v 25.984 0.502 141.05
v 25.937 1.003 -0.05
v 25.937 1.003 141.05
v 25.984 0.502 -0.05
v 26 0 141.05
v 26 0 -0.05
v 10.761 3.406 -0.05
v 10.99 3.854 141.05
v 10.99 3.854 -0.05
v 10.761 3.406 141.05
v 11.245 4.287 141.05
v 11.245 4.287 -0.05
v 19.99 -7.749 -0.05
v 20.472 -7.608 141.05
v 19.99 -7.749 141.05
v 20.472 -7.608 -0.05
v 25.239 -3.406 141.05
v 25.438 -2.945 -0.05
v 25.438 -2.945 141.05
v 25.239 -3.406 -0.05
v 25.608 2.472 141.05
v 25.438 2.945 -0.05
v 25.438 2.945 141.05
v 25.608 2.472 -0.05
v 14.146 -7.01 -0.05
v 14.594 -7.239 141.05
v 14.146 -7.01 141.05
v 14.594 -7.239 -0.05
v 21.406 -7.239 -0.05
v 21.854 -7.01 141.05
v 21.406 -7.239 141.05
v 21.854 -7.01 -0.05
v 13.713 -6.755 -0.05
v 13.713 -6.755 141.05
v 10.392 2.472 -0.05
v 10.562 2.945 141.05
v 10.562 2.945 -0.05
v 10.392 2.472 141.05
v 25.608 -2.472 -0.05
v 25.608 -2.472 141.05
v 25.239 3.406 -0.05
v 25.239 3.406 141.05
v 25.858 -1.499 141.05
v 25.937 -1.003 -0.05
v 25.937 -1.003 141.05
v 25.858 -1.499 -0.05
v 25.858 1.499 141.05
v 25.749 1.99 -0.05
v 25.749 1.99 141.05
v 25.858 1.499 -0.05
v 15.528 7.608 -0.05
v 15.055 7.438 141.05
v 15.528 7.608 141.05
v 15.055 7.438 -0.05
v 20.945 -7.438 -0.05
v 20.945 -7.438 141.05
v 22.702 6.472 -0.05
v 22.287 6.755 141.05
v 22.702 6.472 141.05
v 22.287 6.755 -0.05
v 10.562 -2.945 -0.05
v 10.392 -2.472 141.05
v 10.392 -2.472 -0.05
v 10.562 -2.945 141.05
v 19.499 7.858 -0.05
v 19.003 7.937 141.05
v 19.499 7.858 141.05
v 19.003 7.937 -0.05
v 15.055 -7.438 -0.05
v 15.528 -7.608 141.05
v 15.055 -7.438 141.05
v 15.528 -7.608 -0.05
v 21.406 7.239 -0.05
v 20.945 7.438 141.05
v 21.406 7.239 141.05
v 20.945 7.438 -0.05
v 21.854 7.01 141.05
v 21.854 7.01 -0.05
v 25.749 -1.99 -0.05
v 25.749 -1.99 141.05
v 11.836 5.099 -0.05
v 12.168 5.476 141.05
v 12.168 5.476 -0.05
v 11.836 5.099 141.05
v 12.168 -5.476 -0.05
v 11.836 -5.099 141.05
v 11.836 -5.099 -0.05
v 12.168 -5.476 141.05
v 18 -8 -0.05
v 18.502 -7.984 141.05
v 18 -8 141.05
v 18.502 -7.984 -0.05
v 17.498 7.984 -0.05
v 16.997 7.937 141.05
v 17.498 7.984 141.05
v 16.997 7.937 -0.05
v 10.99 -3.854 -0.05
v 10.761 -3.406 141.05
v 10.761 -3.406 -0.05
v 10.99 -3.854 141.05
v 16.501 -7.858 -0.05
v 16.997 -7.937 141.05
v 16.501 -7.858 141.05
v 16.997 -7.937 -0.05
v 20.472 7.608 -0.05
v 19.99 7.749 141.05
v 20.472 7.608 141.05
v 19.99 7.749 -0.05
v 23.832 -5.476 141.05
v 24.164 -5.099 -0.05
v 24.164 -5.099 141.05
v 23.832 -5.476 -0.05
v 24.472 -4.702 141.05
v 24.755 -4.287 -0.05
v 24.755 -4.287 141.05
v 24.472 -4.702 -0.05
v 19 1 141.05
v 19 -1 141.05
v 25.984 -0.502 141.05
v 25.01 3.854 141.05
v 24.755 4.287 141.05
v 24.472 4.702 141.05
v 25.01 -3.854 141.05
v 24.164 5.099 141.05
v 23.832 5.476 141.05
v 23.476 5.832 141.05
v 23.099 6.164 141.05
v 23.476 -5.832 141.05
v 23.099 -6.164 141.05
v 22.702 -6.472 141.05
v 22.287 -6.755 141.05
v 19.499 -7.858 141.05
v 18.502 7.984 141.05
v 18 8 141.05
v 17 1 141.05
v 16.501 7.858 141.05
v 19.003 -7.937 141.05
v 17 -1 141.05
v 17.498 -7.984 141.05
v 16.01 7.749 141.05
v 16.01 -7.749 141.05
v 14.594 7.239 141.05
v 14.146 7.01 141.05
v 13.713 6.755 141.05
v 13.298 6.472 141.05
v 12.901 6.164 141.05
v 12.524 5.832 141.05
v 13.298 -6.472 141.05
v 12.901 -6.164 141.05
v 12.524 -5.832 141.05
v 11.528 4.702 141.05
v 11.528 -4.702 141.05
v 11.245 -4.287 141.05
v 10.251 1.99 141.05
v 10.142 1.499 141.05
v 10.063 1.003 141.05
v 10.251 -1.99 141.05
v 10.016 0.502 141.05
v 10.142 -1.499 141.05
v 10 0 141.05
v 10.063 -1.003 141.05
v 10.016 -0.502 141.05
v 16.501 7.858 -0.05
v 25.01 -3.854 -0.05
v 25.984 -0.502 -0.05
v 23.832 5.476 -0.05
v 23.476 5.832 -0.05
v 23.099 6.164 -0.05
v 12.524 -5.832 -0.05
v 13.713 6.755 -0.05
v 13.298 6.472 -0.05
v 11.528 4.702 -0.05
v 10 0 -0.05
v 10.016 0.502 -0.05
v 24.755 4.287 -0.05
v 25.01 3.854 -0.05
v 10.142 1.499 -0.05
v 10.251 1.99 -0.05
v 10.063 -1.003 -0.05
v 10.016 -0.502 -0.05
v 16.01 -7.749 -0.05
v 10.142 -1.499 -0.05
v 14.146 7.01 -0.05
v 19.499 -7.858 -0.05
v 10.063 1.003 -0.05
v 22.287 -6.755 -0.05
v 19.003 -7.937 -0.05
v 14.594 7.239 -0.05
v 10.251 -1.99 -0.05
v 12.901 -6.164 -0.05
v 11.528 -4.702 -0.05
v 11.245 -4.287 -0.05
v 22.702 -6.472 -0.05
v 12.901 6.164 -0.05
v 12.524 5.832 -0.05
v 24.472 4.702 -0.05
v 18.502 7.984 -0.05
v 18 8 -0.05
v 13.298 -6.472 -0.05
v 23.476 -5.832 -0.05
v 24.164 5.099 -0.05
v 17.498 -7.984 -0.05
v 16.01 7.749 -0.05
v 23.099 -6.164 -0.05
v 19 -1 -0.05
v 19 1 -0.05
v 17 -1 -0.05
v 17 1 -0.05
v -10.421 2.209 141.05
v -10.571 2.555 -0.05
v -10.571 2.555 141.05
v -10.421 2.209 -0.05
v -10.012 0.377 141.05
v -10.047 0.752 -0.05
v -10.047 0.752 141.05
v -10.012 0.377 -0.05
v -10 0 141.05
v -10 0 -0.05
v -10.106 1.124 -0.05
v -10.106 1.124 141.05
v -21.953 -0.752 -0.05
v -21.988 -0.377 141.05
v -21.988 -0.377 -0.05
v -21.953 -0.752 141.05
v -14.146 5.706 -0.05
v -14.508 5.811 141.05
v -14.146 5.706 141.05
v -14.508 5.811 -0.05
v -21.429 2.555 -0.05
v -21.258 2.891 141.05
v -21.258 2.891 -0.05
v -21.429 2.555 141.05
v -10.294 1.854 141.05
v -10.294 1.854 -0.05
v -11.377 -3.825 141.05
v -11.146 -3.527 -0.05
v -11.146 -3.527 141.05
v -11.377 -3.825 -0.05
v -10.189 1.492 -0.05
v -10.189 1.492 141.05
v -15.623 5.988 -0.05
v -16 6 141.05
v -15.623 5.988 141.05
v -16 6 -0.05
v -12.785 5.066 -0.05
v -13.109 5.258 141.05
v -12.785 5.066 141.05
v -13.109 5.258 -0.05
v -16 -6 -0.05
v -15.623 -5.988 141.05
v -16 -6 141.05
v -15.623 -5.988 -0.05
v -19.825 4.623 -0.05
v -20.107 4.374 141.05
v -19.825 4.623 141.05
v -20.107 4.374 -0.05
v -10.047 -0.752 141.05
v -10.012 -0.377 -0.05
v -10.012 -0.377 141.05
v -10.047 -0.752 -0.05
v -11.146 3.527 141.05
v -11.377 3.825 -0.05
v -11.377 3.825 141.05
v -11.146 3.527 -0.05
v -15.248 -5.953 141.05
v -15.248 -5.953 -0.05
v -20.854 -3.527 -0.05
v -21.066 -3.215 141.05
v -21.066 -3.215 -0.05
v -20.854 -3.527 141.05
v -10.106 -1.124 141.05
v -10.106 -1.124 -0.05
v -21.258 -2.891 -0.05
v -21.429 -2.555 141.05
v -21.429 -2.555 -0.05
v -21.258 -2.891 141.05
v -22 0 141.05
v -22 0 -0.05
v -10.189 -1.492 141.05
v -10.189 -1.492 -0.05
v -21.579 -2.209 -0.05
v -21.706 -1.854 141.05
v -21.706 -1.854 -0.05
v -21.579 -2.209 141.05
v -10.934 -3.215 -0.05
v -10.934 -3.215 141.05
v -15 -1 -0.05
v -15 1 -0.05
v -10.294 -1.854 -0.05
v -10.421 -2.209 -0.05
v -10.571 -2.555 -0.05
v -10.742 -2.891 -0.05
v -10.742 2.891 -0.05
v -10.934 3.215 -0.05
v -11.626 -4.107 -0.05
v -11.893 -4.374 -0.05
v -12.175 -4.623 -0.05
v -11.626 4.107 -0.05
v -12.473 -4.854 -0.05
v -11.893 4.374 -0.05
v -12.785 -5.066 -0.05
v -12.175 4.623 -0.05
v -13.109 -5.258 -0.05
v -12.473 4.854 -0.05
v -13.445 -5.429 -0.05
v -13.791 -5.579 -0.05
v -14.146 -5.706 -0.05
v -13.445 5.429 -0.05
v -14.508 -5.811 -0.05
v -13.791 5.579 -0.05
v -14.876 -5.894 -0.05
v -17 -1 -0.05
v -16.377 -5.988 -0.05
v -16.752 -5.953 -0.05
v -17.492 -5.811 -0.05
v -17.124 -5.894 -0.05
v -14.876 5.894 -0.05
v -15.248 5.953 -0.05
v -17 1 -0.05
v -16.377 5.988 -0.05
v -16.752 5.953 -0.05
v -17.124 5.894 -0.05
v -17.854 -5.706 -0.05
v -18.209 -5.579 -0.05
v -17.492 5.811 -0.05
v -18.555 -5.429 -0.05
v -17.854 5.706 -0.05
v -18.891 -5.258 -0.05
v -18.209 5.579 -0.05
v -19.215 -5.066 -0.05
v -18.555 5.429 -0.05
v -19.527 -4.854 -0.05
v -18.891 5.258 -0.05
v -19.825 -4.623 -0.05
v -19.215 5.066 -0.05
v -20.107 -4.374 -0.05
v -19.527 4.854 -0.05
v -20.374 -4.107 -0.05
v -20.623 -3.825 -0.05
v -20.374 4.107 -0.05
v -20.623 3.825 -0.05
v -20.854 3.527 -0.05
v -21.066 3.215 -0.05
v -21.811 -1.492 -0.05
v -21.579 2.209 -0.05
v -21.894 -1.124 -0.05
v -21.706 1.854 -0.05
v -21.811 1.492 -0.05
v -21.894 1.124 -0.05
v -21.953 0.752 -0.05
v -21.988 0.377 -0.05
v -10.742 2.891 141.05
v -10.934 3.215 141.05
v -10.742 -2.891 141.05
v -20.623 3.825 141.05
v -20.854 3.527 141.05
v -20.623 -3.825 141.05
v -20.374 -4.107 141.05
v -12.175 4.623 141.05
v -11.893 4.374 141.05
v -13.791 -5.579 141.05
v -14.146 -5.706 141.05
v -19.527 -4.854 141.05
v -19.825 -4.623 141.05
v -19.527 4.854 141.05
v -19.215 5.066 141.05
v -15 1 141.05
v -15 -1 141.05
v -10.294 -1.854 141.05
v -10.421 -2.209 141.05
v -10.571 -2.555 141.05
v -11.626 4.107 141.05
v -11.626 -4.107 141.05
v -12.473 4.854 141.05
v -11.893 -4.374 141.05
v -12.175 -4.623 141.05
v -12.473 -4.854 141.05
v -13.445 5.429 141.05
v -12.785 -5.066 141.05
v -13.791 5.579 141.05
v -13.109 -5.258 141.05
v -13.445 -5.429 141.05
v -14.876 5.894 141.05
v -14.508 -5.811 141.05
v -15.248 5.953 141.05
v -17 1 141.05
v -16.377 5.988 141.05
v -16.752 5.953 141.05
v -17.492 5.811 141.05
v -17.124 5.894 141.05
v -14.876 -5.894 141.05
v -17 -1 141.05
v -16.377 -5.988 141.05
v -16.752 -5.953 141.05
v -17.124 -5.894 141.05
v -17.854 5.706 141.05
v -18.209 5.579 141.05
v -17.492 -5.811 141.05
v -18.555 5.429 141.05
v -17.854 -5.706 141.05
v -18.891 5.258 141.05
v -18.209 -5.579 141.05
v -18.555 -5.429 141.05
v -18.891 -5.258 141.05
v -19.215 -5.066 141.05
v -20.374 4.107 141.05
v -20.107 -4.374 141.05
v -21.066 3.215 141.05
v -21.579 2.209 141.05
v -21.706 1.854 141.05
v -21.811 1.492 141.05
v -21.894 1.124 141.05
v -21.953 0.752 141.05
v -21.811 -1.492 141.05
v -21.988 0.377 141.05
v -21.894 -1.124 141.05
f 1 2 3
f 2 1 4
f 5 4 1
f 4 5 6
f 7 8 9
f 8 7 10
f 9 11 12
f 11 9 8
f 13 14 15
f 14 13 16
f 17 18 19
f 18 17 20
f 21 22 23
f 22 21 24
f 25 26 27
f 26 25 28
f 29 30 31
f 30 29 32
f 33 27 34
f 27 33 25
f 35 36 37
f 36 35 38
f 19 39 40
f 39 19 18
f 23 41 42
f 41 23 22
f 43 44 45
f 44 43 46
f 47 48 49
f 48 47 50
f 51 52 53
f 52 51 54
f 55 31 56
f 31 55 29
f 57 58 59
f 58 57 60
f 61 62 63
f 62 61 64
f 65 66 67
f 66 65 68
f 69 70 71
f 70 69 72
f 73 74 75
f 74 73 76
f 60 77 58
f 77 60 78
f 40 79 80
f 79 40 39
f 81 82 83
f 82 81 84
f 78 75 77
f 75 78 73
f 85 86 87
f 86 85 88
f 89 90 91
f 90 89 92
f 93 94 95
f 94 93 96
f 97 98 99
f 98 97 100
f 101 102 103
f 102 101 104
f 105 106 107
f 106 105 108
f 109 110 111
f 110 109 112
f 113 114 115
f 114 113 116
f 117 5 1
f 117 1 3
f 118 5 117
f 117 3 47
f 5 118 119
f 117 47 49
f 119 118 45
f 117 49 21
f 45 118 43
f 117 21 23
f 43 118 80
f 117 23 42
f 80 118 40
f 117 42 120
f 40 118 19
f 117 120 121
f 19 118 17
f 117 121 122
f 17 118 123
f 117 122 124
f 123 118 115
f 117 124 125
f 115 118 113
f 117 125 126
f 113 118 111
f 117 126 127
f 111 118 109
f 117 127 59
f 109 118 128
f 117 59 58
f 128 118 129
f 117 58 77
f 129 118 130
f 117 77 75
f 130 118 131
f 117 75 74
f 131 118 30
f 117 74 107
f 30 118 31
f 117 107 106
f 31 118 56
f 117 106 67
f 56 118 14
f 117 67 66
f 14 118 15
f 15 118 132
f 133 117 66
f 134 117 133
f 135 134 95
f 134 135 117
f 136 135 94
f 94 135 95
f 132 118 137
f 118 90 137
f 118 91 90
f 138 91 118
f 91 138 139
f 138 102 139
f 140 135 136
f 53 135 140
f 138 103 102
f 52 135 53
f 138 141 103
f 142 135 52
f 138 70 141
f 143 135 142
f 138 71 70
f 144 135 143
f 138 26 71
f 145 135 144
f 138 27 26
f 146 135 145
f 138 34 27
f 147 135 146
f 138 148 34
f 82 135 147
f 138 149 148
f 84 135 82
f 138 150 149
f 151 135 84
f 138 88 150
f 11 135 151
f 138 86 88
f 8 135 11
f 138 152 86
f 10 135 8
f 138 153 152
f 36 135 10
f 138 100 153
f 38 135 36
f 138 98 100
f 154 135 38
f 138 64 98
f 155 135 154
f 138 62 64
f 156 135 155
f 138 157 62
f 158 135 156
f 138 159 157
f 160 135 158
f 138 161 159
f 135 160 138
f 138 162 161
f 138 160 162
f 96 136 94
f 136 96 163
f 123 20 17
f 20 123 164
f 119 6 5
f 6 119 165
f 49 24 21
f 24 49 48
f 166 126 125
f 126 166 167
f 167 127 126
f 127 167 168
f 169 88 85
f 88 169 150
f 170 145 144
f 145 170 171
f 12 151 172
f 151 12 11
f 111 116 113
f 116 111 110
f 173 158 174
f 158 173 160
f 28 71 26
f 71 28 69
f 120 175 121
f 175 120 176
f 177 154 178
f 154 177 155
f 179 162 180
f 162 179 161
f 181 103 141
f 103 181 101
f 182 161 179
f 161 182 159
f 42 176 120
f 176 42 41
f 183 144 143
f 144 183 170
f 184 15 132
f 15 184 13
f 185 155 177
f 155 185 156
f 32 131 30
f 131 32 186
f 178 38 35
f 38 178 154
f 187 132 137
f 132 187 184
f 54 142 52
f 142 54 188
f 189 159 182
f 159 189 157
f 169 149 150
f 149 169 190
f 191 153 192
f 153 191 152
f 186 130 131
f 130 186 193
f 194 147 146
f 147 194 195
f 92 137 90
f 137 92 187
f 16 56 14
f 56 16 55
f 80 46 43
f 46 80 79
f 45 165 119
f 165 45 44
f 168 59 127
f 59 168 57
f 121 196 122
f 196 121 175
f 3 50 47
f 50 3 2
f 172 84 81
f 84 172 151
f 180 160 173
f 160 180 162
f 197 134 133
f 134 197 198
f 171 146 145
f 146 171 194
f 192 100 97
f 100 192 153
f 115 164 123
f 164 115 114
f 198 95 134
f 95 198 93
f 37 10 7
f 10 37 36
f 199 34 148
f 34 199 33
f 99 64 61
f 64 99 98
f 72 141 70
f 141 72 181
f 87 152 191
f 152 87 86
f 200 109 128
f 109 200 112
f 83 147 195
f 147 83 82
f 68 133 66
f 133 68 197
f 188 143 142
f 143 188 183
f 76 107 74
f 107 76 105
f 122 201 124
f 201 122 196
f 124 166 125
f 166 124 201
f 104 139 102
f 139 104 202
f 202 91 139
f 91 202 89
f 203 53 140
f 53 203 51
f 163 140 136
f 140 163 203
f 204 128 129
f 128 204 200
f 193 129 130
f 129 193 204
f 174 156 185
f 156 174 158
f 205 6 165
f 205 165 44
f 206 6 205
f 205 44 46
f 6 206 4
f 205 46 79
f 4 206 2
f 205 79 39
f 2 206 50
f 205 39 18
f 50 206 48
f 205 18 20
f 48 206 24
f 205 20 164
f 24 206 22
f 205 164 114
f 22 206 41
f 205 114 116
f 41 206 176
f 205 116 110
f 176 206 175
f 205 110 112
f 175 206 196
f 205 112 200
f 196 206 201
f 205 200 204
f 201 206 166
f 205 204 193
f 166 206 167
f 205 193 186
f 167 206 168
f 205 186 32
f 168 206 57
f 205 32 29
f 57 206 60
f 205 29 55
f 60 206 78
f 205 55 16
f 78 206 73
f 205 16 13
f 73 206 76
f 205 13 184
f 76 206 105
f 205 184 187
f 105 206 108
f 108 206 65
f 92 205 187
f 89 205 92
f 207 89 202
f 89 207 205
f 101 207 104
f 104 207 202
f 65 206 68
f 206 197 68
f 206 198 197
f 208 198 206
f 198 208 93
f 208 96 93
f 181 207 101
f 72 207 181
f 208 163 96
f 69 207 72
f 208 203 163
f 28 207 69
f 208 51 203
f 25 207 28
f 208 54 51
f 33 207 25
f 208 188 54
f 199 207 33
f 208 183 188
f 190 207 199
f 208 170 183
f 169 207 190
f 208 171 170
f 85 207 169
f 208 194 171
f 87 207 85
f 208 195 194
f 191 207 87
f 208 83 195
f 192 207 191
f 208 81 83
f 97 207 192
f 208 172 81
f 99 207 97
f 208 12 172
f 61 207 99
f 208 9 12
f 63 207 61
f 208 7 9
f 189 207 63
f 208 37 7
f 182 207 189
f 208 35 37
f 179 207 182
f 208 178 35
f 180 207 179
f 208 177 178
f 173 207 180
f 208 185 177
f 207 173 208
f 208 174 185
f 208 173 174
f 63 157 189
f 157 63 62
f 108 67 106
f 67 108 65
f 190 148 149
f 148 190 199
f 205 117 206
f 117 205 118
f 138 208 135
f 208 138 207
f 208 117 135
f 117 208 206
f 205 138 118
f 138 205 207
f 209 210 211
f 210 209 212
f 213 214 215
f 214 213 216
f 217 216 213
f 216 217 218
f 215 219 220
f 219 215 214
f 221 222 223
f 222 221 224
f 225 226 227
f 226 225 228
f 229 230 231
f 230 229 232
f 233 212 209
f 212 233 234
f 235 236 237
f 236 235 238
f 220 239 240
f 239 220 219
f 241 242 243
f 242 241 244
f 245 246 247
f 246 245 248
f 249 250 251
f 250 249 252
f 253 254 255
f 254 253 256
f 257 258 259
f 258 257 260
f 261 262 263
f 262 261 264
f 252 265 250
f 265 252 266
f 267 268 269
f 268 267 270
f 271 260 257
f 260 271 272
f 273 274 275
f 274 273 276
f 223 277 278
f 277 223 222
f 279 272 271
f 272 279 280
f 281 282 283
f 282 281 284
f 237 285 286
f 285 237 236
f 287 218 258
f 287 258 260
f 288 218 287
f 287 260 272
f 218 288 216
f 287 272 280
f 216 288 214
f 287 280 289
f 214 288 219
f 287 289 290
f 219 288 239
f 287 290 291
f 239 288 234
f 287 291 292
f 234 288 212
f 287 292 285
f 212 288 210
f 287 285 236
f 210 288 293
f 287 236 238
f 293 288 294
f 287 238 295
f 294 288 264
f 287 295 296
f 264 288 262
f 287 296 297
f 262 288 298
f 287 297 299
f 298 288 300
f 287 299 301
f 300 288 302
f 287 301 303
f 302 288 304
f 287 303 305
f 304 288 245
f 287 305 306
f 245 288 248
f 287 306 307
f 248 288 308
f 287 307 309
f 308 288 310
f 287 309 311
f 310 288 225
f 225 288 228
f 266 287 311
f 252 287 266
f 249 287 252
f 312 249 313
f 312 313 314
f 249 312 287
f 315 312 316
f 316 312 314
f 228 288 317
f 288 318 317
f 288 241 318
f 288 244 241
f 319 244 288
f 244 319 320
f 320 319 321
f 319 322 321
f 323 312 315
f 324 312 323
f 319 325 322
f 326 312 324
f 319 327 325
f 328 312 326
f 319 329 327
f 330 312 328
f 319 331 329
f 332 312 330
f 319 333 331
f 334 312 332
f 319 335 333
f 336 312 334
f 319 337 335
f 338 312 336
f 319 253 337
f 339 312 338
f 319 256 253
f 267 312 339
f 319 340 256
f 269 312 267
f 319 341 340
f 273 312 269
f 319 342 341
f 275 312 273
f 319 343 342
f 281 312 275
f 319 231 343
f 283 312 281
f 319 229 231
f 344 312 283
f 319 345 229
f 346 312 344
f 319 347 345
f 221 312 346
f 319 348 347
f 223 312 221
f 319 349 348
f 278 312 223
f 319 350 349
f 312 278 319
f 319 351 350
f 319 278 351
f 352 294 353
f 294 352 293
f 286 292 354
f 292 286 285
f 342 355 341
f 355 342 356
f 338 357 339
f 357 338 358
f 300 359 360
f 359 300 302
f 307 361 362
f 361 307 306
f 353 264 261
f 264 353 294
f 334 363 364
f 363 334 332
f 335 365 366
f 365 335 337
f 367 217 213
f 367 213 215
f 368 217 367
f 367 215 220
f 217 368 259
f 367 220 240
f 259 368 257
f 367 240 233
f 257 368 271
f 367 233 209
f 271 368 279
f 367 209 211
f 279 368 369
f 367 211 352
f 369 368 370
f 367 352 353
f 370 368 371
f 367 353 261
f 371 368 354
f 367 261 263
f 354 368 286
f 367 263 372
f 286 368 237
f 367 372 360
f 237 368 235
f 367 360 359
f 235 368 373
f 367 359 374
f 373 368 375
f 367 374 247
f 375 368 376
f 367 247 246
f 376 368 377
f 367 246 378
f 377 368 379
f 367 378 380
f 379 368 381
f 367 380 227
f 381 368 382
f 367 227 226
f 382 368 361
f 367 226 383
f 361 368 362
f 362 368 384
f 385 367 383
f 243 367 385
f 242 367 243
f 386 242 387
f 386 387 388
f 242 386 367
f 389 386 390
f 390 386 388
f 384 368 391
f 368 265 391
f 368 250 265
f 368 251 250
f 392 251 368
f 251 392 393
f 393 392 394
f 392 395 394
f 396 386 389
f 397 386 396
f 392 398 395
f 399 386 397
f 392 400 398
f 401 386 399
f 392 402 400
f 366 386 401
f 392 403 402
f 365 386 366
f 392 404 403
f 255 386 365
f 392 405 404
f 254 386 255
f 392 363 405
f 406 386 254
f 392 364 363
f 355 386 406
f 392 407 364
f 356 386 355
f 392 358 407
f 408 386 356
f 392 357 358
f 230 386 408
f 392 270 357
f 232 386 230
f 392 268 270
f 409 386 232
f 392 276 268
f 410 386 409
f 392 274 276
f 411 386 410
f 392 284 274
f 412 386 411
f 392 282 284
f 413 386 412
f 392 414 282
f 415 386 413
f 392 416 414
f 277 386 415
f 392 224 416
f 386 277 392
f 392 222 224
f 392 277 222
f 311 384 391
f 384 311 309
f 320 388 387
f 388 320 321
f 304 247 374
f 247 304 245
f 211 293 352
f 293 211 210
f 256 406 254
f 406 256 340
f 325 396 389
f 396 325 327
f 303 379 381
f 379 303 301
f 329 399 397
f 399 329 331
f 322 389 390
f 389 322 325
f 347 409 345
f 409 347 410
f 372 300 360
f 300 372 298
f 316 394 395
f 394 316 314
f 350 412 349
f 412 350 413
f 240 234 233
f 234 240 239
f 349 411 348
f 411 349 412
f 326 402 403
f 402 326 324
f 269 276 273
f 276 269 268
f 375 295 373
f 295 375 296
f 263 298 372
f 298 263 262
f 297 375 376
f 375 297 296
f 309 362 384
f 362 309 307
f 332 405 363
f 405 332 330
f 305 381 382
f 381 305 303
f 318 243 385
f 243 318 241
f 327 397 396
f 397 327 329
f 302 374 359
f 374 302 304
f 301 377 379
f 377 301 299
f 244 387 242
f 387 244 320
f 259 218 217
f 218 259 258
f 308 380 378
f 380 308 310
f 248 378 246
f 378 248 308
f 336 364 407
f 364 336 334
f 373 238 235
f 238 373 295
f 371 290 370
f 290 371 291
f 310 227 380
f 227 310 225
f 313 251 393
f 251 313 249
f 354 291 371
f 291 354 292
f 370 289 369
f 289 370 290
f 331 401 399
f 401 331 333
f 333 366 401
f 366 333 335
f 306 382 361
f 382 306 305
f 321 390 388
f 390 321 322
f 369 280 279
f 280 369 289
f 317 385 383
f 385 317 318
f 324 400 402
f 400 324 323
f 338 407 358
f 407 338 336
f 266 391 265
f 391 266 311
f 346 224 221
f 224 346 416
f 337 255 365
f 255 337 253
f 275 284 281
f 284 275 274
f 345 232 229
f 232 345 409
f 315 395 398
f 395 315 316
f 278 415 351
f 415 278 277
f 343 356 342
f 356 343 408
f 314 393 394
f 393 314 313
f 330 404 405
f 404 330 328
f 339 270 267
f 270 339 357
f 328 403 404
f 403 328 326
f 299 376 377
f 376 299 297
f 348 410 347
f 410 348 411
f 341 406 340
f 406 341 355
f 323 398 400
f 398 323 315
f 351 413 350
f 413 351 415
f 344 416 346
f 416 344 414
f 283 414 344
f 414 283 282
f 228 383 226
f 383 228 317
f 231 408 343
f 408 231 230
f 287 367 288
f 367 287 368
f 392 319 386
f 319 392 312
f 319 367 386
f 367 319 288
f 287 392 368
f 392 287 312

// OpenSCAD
// file: ../Settings.scad
// Mesurements Of Platform Actual & Global Settings
// Mesurements ACTUAL
PlateWidth = 228;
PlateDepth = 145;
PlateHeight = 5;

ArmWidth = 20;
ArmHeight = 24;
ArmForwardProjection = 25;
ArmRearProjection = 50;
ArmVOffset = 15;

BaseWidth = 129;
BaseHeight = 5;
BaseForwardProjection = 10;
BaseRearProjection = 10;
BaseVOffset = 20;

BaseDeflectorLength = 20;
BaseDeflectorAngle = 45;

ScrewsWidthOutset = 35;
ScrewsDepthOutset = 35;
ScrewsHeadRadius = 10;
ScrewsHeadHeight = 2;
ScrewsHeadProtrusion = 5;
ScrewsShaftRadius = 2;
ScrewsHeadCutoutRadius = 2;

RearPlugWidth = 10;
RearPlugHeight = 5;
RearPlugVOffset = 1;

// Options
// ****************************************************************************************************

d = 0.05;   //Delta

ClipSticksize = 8;
PlateThickness = 5;

TensionerBearingRadius = 2;
TensionerOffsetRadius = 15;
TensionerAngle = 45;
TensionerBearingExtention = 3;
TensionerInset = 2;

//lips to keep the belt in
Lip = 3;
//TopLip = 500;
BottomLip = 5;

MidPlateOverlap = 20;
MidPlateOverlapHeight = 10;
MidPlateOverlapOffset = 7;
ClipHoleSize = 5;

LowerPlateCrossover =10;

RollerCore = 2;
RollerClearance = 2;
RollerLength = PlateDepth - 2*RollerClearance;

UpperRollerProjection  = 40;
UpperRollerRadius = 8;

LowerRollerProjection = 20;
LowerRollerRadius = 6;

RollerBearingCutoutRadius = 3;

IbeamProjection = 15;
IbeamPlateThikness = 6;


// Calculated
// ************************************************************************************************************
PlateX = BaseWidth/2;

RollerLength = PlateDepth - 2*RollerClearance;
PlateArmOverhang = PlateWidth/2 - BaseWidth/2  - ArmWidth; 

UpperRollerPlateX = ArmWidth+PlateArmOverhang+UpperRollerProjection-UpperRollerRadius;
UpperRollerPlateY = -UpperRollerRadius; 

LowerRollerPlateX = ArmWidth+PlateArmOverhang+LowerRollerProjection-LowerRollerRadius;
LowerRollerPlateY = -(ArmVOffset+ArmHeight)+LowerRollerRadius;
// main file
// Roller Project Part #1 Front Bracket

include <../Settings.scad>;



RollersDefaults_Length = RollerLength+2*RollerClearance+2*PlateThickness+40;


translate(v = [10+UpperRollerRadius,0,0]){
	UpperRoller();
}

translate(v = [-10-LowerRollerRadius,0,0]){
	LowerRoller();
}

//CoreRod();

Washer();


module Washer(
l = 0.1,
h = 1,
r){
	HollowCylinder(r-l,h , RollerCore);
}


module UpperRoller(){
	HollowCylinder(UpperRollerRadius, RollerLength, RollerCore);
}

module LowerRoller(){
	HollowCylinder(LowerRollerRadius, RollerLength, RollerCore);
}

module CoreRod(
	Length = RollersDefaults_Length ){
	translate(v = [-RollerCore/2,-RollerCore/2,0]){
		cube(size = [RollerCore,RollerCore,Length]);
	}
}

module HollowCylinder(r,h,c){
	difference(){	
		translate(v = [0,0,-d]){
			cylinder(h = h+2*d, r =  r, $fn = 100);
		}
		translate(v = [-c/2,-c/2, - 2*d]){
			cube(size = [c,c,h+4*d]);
		}
	}
}
